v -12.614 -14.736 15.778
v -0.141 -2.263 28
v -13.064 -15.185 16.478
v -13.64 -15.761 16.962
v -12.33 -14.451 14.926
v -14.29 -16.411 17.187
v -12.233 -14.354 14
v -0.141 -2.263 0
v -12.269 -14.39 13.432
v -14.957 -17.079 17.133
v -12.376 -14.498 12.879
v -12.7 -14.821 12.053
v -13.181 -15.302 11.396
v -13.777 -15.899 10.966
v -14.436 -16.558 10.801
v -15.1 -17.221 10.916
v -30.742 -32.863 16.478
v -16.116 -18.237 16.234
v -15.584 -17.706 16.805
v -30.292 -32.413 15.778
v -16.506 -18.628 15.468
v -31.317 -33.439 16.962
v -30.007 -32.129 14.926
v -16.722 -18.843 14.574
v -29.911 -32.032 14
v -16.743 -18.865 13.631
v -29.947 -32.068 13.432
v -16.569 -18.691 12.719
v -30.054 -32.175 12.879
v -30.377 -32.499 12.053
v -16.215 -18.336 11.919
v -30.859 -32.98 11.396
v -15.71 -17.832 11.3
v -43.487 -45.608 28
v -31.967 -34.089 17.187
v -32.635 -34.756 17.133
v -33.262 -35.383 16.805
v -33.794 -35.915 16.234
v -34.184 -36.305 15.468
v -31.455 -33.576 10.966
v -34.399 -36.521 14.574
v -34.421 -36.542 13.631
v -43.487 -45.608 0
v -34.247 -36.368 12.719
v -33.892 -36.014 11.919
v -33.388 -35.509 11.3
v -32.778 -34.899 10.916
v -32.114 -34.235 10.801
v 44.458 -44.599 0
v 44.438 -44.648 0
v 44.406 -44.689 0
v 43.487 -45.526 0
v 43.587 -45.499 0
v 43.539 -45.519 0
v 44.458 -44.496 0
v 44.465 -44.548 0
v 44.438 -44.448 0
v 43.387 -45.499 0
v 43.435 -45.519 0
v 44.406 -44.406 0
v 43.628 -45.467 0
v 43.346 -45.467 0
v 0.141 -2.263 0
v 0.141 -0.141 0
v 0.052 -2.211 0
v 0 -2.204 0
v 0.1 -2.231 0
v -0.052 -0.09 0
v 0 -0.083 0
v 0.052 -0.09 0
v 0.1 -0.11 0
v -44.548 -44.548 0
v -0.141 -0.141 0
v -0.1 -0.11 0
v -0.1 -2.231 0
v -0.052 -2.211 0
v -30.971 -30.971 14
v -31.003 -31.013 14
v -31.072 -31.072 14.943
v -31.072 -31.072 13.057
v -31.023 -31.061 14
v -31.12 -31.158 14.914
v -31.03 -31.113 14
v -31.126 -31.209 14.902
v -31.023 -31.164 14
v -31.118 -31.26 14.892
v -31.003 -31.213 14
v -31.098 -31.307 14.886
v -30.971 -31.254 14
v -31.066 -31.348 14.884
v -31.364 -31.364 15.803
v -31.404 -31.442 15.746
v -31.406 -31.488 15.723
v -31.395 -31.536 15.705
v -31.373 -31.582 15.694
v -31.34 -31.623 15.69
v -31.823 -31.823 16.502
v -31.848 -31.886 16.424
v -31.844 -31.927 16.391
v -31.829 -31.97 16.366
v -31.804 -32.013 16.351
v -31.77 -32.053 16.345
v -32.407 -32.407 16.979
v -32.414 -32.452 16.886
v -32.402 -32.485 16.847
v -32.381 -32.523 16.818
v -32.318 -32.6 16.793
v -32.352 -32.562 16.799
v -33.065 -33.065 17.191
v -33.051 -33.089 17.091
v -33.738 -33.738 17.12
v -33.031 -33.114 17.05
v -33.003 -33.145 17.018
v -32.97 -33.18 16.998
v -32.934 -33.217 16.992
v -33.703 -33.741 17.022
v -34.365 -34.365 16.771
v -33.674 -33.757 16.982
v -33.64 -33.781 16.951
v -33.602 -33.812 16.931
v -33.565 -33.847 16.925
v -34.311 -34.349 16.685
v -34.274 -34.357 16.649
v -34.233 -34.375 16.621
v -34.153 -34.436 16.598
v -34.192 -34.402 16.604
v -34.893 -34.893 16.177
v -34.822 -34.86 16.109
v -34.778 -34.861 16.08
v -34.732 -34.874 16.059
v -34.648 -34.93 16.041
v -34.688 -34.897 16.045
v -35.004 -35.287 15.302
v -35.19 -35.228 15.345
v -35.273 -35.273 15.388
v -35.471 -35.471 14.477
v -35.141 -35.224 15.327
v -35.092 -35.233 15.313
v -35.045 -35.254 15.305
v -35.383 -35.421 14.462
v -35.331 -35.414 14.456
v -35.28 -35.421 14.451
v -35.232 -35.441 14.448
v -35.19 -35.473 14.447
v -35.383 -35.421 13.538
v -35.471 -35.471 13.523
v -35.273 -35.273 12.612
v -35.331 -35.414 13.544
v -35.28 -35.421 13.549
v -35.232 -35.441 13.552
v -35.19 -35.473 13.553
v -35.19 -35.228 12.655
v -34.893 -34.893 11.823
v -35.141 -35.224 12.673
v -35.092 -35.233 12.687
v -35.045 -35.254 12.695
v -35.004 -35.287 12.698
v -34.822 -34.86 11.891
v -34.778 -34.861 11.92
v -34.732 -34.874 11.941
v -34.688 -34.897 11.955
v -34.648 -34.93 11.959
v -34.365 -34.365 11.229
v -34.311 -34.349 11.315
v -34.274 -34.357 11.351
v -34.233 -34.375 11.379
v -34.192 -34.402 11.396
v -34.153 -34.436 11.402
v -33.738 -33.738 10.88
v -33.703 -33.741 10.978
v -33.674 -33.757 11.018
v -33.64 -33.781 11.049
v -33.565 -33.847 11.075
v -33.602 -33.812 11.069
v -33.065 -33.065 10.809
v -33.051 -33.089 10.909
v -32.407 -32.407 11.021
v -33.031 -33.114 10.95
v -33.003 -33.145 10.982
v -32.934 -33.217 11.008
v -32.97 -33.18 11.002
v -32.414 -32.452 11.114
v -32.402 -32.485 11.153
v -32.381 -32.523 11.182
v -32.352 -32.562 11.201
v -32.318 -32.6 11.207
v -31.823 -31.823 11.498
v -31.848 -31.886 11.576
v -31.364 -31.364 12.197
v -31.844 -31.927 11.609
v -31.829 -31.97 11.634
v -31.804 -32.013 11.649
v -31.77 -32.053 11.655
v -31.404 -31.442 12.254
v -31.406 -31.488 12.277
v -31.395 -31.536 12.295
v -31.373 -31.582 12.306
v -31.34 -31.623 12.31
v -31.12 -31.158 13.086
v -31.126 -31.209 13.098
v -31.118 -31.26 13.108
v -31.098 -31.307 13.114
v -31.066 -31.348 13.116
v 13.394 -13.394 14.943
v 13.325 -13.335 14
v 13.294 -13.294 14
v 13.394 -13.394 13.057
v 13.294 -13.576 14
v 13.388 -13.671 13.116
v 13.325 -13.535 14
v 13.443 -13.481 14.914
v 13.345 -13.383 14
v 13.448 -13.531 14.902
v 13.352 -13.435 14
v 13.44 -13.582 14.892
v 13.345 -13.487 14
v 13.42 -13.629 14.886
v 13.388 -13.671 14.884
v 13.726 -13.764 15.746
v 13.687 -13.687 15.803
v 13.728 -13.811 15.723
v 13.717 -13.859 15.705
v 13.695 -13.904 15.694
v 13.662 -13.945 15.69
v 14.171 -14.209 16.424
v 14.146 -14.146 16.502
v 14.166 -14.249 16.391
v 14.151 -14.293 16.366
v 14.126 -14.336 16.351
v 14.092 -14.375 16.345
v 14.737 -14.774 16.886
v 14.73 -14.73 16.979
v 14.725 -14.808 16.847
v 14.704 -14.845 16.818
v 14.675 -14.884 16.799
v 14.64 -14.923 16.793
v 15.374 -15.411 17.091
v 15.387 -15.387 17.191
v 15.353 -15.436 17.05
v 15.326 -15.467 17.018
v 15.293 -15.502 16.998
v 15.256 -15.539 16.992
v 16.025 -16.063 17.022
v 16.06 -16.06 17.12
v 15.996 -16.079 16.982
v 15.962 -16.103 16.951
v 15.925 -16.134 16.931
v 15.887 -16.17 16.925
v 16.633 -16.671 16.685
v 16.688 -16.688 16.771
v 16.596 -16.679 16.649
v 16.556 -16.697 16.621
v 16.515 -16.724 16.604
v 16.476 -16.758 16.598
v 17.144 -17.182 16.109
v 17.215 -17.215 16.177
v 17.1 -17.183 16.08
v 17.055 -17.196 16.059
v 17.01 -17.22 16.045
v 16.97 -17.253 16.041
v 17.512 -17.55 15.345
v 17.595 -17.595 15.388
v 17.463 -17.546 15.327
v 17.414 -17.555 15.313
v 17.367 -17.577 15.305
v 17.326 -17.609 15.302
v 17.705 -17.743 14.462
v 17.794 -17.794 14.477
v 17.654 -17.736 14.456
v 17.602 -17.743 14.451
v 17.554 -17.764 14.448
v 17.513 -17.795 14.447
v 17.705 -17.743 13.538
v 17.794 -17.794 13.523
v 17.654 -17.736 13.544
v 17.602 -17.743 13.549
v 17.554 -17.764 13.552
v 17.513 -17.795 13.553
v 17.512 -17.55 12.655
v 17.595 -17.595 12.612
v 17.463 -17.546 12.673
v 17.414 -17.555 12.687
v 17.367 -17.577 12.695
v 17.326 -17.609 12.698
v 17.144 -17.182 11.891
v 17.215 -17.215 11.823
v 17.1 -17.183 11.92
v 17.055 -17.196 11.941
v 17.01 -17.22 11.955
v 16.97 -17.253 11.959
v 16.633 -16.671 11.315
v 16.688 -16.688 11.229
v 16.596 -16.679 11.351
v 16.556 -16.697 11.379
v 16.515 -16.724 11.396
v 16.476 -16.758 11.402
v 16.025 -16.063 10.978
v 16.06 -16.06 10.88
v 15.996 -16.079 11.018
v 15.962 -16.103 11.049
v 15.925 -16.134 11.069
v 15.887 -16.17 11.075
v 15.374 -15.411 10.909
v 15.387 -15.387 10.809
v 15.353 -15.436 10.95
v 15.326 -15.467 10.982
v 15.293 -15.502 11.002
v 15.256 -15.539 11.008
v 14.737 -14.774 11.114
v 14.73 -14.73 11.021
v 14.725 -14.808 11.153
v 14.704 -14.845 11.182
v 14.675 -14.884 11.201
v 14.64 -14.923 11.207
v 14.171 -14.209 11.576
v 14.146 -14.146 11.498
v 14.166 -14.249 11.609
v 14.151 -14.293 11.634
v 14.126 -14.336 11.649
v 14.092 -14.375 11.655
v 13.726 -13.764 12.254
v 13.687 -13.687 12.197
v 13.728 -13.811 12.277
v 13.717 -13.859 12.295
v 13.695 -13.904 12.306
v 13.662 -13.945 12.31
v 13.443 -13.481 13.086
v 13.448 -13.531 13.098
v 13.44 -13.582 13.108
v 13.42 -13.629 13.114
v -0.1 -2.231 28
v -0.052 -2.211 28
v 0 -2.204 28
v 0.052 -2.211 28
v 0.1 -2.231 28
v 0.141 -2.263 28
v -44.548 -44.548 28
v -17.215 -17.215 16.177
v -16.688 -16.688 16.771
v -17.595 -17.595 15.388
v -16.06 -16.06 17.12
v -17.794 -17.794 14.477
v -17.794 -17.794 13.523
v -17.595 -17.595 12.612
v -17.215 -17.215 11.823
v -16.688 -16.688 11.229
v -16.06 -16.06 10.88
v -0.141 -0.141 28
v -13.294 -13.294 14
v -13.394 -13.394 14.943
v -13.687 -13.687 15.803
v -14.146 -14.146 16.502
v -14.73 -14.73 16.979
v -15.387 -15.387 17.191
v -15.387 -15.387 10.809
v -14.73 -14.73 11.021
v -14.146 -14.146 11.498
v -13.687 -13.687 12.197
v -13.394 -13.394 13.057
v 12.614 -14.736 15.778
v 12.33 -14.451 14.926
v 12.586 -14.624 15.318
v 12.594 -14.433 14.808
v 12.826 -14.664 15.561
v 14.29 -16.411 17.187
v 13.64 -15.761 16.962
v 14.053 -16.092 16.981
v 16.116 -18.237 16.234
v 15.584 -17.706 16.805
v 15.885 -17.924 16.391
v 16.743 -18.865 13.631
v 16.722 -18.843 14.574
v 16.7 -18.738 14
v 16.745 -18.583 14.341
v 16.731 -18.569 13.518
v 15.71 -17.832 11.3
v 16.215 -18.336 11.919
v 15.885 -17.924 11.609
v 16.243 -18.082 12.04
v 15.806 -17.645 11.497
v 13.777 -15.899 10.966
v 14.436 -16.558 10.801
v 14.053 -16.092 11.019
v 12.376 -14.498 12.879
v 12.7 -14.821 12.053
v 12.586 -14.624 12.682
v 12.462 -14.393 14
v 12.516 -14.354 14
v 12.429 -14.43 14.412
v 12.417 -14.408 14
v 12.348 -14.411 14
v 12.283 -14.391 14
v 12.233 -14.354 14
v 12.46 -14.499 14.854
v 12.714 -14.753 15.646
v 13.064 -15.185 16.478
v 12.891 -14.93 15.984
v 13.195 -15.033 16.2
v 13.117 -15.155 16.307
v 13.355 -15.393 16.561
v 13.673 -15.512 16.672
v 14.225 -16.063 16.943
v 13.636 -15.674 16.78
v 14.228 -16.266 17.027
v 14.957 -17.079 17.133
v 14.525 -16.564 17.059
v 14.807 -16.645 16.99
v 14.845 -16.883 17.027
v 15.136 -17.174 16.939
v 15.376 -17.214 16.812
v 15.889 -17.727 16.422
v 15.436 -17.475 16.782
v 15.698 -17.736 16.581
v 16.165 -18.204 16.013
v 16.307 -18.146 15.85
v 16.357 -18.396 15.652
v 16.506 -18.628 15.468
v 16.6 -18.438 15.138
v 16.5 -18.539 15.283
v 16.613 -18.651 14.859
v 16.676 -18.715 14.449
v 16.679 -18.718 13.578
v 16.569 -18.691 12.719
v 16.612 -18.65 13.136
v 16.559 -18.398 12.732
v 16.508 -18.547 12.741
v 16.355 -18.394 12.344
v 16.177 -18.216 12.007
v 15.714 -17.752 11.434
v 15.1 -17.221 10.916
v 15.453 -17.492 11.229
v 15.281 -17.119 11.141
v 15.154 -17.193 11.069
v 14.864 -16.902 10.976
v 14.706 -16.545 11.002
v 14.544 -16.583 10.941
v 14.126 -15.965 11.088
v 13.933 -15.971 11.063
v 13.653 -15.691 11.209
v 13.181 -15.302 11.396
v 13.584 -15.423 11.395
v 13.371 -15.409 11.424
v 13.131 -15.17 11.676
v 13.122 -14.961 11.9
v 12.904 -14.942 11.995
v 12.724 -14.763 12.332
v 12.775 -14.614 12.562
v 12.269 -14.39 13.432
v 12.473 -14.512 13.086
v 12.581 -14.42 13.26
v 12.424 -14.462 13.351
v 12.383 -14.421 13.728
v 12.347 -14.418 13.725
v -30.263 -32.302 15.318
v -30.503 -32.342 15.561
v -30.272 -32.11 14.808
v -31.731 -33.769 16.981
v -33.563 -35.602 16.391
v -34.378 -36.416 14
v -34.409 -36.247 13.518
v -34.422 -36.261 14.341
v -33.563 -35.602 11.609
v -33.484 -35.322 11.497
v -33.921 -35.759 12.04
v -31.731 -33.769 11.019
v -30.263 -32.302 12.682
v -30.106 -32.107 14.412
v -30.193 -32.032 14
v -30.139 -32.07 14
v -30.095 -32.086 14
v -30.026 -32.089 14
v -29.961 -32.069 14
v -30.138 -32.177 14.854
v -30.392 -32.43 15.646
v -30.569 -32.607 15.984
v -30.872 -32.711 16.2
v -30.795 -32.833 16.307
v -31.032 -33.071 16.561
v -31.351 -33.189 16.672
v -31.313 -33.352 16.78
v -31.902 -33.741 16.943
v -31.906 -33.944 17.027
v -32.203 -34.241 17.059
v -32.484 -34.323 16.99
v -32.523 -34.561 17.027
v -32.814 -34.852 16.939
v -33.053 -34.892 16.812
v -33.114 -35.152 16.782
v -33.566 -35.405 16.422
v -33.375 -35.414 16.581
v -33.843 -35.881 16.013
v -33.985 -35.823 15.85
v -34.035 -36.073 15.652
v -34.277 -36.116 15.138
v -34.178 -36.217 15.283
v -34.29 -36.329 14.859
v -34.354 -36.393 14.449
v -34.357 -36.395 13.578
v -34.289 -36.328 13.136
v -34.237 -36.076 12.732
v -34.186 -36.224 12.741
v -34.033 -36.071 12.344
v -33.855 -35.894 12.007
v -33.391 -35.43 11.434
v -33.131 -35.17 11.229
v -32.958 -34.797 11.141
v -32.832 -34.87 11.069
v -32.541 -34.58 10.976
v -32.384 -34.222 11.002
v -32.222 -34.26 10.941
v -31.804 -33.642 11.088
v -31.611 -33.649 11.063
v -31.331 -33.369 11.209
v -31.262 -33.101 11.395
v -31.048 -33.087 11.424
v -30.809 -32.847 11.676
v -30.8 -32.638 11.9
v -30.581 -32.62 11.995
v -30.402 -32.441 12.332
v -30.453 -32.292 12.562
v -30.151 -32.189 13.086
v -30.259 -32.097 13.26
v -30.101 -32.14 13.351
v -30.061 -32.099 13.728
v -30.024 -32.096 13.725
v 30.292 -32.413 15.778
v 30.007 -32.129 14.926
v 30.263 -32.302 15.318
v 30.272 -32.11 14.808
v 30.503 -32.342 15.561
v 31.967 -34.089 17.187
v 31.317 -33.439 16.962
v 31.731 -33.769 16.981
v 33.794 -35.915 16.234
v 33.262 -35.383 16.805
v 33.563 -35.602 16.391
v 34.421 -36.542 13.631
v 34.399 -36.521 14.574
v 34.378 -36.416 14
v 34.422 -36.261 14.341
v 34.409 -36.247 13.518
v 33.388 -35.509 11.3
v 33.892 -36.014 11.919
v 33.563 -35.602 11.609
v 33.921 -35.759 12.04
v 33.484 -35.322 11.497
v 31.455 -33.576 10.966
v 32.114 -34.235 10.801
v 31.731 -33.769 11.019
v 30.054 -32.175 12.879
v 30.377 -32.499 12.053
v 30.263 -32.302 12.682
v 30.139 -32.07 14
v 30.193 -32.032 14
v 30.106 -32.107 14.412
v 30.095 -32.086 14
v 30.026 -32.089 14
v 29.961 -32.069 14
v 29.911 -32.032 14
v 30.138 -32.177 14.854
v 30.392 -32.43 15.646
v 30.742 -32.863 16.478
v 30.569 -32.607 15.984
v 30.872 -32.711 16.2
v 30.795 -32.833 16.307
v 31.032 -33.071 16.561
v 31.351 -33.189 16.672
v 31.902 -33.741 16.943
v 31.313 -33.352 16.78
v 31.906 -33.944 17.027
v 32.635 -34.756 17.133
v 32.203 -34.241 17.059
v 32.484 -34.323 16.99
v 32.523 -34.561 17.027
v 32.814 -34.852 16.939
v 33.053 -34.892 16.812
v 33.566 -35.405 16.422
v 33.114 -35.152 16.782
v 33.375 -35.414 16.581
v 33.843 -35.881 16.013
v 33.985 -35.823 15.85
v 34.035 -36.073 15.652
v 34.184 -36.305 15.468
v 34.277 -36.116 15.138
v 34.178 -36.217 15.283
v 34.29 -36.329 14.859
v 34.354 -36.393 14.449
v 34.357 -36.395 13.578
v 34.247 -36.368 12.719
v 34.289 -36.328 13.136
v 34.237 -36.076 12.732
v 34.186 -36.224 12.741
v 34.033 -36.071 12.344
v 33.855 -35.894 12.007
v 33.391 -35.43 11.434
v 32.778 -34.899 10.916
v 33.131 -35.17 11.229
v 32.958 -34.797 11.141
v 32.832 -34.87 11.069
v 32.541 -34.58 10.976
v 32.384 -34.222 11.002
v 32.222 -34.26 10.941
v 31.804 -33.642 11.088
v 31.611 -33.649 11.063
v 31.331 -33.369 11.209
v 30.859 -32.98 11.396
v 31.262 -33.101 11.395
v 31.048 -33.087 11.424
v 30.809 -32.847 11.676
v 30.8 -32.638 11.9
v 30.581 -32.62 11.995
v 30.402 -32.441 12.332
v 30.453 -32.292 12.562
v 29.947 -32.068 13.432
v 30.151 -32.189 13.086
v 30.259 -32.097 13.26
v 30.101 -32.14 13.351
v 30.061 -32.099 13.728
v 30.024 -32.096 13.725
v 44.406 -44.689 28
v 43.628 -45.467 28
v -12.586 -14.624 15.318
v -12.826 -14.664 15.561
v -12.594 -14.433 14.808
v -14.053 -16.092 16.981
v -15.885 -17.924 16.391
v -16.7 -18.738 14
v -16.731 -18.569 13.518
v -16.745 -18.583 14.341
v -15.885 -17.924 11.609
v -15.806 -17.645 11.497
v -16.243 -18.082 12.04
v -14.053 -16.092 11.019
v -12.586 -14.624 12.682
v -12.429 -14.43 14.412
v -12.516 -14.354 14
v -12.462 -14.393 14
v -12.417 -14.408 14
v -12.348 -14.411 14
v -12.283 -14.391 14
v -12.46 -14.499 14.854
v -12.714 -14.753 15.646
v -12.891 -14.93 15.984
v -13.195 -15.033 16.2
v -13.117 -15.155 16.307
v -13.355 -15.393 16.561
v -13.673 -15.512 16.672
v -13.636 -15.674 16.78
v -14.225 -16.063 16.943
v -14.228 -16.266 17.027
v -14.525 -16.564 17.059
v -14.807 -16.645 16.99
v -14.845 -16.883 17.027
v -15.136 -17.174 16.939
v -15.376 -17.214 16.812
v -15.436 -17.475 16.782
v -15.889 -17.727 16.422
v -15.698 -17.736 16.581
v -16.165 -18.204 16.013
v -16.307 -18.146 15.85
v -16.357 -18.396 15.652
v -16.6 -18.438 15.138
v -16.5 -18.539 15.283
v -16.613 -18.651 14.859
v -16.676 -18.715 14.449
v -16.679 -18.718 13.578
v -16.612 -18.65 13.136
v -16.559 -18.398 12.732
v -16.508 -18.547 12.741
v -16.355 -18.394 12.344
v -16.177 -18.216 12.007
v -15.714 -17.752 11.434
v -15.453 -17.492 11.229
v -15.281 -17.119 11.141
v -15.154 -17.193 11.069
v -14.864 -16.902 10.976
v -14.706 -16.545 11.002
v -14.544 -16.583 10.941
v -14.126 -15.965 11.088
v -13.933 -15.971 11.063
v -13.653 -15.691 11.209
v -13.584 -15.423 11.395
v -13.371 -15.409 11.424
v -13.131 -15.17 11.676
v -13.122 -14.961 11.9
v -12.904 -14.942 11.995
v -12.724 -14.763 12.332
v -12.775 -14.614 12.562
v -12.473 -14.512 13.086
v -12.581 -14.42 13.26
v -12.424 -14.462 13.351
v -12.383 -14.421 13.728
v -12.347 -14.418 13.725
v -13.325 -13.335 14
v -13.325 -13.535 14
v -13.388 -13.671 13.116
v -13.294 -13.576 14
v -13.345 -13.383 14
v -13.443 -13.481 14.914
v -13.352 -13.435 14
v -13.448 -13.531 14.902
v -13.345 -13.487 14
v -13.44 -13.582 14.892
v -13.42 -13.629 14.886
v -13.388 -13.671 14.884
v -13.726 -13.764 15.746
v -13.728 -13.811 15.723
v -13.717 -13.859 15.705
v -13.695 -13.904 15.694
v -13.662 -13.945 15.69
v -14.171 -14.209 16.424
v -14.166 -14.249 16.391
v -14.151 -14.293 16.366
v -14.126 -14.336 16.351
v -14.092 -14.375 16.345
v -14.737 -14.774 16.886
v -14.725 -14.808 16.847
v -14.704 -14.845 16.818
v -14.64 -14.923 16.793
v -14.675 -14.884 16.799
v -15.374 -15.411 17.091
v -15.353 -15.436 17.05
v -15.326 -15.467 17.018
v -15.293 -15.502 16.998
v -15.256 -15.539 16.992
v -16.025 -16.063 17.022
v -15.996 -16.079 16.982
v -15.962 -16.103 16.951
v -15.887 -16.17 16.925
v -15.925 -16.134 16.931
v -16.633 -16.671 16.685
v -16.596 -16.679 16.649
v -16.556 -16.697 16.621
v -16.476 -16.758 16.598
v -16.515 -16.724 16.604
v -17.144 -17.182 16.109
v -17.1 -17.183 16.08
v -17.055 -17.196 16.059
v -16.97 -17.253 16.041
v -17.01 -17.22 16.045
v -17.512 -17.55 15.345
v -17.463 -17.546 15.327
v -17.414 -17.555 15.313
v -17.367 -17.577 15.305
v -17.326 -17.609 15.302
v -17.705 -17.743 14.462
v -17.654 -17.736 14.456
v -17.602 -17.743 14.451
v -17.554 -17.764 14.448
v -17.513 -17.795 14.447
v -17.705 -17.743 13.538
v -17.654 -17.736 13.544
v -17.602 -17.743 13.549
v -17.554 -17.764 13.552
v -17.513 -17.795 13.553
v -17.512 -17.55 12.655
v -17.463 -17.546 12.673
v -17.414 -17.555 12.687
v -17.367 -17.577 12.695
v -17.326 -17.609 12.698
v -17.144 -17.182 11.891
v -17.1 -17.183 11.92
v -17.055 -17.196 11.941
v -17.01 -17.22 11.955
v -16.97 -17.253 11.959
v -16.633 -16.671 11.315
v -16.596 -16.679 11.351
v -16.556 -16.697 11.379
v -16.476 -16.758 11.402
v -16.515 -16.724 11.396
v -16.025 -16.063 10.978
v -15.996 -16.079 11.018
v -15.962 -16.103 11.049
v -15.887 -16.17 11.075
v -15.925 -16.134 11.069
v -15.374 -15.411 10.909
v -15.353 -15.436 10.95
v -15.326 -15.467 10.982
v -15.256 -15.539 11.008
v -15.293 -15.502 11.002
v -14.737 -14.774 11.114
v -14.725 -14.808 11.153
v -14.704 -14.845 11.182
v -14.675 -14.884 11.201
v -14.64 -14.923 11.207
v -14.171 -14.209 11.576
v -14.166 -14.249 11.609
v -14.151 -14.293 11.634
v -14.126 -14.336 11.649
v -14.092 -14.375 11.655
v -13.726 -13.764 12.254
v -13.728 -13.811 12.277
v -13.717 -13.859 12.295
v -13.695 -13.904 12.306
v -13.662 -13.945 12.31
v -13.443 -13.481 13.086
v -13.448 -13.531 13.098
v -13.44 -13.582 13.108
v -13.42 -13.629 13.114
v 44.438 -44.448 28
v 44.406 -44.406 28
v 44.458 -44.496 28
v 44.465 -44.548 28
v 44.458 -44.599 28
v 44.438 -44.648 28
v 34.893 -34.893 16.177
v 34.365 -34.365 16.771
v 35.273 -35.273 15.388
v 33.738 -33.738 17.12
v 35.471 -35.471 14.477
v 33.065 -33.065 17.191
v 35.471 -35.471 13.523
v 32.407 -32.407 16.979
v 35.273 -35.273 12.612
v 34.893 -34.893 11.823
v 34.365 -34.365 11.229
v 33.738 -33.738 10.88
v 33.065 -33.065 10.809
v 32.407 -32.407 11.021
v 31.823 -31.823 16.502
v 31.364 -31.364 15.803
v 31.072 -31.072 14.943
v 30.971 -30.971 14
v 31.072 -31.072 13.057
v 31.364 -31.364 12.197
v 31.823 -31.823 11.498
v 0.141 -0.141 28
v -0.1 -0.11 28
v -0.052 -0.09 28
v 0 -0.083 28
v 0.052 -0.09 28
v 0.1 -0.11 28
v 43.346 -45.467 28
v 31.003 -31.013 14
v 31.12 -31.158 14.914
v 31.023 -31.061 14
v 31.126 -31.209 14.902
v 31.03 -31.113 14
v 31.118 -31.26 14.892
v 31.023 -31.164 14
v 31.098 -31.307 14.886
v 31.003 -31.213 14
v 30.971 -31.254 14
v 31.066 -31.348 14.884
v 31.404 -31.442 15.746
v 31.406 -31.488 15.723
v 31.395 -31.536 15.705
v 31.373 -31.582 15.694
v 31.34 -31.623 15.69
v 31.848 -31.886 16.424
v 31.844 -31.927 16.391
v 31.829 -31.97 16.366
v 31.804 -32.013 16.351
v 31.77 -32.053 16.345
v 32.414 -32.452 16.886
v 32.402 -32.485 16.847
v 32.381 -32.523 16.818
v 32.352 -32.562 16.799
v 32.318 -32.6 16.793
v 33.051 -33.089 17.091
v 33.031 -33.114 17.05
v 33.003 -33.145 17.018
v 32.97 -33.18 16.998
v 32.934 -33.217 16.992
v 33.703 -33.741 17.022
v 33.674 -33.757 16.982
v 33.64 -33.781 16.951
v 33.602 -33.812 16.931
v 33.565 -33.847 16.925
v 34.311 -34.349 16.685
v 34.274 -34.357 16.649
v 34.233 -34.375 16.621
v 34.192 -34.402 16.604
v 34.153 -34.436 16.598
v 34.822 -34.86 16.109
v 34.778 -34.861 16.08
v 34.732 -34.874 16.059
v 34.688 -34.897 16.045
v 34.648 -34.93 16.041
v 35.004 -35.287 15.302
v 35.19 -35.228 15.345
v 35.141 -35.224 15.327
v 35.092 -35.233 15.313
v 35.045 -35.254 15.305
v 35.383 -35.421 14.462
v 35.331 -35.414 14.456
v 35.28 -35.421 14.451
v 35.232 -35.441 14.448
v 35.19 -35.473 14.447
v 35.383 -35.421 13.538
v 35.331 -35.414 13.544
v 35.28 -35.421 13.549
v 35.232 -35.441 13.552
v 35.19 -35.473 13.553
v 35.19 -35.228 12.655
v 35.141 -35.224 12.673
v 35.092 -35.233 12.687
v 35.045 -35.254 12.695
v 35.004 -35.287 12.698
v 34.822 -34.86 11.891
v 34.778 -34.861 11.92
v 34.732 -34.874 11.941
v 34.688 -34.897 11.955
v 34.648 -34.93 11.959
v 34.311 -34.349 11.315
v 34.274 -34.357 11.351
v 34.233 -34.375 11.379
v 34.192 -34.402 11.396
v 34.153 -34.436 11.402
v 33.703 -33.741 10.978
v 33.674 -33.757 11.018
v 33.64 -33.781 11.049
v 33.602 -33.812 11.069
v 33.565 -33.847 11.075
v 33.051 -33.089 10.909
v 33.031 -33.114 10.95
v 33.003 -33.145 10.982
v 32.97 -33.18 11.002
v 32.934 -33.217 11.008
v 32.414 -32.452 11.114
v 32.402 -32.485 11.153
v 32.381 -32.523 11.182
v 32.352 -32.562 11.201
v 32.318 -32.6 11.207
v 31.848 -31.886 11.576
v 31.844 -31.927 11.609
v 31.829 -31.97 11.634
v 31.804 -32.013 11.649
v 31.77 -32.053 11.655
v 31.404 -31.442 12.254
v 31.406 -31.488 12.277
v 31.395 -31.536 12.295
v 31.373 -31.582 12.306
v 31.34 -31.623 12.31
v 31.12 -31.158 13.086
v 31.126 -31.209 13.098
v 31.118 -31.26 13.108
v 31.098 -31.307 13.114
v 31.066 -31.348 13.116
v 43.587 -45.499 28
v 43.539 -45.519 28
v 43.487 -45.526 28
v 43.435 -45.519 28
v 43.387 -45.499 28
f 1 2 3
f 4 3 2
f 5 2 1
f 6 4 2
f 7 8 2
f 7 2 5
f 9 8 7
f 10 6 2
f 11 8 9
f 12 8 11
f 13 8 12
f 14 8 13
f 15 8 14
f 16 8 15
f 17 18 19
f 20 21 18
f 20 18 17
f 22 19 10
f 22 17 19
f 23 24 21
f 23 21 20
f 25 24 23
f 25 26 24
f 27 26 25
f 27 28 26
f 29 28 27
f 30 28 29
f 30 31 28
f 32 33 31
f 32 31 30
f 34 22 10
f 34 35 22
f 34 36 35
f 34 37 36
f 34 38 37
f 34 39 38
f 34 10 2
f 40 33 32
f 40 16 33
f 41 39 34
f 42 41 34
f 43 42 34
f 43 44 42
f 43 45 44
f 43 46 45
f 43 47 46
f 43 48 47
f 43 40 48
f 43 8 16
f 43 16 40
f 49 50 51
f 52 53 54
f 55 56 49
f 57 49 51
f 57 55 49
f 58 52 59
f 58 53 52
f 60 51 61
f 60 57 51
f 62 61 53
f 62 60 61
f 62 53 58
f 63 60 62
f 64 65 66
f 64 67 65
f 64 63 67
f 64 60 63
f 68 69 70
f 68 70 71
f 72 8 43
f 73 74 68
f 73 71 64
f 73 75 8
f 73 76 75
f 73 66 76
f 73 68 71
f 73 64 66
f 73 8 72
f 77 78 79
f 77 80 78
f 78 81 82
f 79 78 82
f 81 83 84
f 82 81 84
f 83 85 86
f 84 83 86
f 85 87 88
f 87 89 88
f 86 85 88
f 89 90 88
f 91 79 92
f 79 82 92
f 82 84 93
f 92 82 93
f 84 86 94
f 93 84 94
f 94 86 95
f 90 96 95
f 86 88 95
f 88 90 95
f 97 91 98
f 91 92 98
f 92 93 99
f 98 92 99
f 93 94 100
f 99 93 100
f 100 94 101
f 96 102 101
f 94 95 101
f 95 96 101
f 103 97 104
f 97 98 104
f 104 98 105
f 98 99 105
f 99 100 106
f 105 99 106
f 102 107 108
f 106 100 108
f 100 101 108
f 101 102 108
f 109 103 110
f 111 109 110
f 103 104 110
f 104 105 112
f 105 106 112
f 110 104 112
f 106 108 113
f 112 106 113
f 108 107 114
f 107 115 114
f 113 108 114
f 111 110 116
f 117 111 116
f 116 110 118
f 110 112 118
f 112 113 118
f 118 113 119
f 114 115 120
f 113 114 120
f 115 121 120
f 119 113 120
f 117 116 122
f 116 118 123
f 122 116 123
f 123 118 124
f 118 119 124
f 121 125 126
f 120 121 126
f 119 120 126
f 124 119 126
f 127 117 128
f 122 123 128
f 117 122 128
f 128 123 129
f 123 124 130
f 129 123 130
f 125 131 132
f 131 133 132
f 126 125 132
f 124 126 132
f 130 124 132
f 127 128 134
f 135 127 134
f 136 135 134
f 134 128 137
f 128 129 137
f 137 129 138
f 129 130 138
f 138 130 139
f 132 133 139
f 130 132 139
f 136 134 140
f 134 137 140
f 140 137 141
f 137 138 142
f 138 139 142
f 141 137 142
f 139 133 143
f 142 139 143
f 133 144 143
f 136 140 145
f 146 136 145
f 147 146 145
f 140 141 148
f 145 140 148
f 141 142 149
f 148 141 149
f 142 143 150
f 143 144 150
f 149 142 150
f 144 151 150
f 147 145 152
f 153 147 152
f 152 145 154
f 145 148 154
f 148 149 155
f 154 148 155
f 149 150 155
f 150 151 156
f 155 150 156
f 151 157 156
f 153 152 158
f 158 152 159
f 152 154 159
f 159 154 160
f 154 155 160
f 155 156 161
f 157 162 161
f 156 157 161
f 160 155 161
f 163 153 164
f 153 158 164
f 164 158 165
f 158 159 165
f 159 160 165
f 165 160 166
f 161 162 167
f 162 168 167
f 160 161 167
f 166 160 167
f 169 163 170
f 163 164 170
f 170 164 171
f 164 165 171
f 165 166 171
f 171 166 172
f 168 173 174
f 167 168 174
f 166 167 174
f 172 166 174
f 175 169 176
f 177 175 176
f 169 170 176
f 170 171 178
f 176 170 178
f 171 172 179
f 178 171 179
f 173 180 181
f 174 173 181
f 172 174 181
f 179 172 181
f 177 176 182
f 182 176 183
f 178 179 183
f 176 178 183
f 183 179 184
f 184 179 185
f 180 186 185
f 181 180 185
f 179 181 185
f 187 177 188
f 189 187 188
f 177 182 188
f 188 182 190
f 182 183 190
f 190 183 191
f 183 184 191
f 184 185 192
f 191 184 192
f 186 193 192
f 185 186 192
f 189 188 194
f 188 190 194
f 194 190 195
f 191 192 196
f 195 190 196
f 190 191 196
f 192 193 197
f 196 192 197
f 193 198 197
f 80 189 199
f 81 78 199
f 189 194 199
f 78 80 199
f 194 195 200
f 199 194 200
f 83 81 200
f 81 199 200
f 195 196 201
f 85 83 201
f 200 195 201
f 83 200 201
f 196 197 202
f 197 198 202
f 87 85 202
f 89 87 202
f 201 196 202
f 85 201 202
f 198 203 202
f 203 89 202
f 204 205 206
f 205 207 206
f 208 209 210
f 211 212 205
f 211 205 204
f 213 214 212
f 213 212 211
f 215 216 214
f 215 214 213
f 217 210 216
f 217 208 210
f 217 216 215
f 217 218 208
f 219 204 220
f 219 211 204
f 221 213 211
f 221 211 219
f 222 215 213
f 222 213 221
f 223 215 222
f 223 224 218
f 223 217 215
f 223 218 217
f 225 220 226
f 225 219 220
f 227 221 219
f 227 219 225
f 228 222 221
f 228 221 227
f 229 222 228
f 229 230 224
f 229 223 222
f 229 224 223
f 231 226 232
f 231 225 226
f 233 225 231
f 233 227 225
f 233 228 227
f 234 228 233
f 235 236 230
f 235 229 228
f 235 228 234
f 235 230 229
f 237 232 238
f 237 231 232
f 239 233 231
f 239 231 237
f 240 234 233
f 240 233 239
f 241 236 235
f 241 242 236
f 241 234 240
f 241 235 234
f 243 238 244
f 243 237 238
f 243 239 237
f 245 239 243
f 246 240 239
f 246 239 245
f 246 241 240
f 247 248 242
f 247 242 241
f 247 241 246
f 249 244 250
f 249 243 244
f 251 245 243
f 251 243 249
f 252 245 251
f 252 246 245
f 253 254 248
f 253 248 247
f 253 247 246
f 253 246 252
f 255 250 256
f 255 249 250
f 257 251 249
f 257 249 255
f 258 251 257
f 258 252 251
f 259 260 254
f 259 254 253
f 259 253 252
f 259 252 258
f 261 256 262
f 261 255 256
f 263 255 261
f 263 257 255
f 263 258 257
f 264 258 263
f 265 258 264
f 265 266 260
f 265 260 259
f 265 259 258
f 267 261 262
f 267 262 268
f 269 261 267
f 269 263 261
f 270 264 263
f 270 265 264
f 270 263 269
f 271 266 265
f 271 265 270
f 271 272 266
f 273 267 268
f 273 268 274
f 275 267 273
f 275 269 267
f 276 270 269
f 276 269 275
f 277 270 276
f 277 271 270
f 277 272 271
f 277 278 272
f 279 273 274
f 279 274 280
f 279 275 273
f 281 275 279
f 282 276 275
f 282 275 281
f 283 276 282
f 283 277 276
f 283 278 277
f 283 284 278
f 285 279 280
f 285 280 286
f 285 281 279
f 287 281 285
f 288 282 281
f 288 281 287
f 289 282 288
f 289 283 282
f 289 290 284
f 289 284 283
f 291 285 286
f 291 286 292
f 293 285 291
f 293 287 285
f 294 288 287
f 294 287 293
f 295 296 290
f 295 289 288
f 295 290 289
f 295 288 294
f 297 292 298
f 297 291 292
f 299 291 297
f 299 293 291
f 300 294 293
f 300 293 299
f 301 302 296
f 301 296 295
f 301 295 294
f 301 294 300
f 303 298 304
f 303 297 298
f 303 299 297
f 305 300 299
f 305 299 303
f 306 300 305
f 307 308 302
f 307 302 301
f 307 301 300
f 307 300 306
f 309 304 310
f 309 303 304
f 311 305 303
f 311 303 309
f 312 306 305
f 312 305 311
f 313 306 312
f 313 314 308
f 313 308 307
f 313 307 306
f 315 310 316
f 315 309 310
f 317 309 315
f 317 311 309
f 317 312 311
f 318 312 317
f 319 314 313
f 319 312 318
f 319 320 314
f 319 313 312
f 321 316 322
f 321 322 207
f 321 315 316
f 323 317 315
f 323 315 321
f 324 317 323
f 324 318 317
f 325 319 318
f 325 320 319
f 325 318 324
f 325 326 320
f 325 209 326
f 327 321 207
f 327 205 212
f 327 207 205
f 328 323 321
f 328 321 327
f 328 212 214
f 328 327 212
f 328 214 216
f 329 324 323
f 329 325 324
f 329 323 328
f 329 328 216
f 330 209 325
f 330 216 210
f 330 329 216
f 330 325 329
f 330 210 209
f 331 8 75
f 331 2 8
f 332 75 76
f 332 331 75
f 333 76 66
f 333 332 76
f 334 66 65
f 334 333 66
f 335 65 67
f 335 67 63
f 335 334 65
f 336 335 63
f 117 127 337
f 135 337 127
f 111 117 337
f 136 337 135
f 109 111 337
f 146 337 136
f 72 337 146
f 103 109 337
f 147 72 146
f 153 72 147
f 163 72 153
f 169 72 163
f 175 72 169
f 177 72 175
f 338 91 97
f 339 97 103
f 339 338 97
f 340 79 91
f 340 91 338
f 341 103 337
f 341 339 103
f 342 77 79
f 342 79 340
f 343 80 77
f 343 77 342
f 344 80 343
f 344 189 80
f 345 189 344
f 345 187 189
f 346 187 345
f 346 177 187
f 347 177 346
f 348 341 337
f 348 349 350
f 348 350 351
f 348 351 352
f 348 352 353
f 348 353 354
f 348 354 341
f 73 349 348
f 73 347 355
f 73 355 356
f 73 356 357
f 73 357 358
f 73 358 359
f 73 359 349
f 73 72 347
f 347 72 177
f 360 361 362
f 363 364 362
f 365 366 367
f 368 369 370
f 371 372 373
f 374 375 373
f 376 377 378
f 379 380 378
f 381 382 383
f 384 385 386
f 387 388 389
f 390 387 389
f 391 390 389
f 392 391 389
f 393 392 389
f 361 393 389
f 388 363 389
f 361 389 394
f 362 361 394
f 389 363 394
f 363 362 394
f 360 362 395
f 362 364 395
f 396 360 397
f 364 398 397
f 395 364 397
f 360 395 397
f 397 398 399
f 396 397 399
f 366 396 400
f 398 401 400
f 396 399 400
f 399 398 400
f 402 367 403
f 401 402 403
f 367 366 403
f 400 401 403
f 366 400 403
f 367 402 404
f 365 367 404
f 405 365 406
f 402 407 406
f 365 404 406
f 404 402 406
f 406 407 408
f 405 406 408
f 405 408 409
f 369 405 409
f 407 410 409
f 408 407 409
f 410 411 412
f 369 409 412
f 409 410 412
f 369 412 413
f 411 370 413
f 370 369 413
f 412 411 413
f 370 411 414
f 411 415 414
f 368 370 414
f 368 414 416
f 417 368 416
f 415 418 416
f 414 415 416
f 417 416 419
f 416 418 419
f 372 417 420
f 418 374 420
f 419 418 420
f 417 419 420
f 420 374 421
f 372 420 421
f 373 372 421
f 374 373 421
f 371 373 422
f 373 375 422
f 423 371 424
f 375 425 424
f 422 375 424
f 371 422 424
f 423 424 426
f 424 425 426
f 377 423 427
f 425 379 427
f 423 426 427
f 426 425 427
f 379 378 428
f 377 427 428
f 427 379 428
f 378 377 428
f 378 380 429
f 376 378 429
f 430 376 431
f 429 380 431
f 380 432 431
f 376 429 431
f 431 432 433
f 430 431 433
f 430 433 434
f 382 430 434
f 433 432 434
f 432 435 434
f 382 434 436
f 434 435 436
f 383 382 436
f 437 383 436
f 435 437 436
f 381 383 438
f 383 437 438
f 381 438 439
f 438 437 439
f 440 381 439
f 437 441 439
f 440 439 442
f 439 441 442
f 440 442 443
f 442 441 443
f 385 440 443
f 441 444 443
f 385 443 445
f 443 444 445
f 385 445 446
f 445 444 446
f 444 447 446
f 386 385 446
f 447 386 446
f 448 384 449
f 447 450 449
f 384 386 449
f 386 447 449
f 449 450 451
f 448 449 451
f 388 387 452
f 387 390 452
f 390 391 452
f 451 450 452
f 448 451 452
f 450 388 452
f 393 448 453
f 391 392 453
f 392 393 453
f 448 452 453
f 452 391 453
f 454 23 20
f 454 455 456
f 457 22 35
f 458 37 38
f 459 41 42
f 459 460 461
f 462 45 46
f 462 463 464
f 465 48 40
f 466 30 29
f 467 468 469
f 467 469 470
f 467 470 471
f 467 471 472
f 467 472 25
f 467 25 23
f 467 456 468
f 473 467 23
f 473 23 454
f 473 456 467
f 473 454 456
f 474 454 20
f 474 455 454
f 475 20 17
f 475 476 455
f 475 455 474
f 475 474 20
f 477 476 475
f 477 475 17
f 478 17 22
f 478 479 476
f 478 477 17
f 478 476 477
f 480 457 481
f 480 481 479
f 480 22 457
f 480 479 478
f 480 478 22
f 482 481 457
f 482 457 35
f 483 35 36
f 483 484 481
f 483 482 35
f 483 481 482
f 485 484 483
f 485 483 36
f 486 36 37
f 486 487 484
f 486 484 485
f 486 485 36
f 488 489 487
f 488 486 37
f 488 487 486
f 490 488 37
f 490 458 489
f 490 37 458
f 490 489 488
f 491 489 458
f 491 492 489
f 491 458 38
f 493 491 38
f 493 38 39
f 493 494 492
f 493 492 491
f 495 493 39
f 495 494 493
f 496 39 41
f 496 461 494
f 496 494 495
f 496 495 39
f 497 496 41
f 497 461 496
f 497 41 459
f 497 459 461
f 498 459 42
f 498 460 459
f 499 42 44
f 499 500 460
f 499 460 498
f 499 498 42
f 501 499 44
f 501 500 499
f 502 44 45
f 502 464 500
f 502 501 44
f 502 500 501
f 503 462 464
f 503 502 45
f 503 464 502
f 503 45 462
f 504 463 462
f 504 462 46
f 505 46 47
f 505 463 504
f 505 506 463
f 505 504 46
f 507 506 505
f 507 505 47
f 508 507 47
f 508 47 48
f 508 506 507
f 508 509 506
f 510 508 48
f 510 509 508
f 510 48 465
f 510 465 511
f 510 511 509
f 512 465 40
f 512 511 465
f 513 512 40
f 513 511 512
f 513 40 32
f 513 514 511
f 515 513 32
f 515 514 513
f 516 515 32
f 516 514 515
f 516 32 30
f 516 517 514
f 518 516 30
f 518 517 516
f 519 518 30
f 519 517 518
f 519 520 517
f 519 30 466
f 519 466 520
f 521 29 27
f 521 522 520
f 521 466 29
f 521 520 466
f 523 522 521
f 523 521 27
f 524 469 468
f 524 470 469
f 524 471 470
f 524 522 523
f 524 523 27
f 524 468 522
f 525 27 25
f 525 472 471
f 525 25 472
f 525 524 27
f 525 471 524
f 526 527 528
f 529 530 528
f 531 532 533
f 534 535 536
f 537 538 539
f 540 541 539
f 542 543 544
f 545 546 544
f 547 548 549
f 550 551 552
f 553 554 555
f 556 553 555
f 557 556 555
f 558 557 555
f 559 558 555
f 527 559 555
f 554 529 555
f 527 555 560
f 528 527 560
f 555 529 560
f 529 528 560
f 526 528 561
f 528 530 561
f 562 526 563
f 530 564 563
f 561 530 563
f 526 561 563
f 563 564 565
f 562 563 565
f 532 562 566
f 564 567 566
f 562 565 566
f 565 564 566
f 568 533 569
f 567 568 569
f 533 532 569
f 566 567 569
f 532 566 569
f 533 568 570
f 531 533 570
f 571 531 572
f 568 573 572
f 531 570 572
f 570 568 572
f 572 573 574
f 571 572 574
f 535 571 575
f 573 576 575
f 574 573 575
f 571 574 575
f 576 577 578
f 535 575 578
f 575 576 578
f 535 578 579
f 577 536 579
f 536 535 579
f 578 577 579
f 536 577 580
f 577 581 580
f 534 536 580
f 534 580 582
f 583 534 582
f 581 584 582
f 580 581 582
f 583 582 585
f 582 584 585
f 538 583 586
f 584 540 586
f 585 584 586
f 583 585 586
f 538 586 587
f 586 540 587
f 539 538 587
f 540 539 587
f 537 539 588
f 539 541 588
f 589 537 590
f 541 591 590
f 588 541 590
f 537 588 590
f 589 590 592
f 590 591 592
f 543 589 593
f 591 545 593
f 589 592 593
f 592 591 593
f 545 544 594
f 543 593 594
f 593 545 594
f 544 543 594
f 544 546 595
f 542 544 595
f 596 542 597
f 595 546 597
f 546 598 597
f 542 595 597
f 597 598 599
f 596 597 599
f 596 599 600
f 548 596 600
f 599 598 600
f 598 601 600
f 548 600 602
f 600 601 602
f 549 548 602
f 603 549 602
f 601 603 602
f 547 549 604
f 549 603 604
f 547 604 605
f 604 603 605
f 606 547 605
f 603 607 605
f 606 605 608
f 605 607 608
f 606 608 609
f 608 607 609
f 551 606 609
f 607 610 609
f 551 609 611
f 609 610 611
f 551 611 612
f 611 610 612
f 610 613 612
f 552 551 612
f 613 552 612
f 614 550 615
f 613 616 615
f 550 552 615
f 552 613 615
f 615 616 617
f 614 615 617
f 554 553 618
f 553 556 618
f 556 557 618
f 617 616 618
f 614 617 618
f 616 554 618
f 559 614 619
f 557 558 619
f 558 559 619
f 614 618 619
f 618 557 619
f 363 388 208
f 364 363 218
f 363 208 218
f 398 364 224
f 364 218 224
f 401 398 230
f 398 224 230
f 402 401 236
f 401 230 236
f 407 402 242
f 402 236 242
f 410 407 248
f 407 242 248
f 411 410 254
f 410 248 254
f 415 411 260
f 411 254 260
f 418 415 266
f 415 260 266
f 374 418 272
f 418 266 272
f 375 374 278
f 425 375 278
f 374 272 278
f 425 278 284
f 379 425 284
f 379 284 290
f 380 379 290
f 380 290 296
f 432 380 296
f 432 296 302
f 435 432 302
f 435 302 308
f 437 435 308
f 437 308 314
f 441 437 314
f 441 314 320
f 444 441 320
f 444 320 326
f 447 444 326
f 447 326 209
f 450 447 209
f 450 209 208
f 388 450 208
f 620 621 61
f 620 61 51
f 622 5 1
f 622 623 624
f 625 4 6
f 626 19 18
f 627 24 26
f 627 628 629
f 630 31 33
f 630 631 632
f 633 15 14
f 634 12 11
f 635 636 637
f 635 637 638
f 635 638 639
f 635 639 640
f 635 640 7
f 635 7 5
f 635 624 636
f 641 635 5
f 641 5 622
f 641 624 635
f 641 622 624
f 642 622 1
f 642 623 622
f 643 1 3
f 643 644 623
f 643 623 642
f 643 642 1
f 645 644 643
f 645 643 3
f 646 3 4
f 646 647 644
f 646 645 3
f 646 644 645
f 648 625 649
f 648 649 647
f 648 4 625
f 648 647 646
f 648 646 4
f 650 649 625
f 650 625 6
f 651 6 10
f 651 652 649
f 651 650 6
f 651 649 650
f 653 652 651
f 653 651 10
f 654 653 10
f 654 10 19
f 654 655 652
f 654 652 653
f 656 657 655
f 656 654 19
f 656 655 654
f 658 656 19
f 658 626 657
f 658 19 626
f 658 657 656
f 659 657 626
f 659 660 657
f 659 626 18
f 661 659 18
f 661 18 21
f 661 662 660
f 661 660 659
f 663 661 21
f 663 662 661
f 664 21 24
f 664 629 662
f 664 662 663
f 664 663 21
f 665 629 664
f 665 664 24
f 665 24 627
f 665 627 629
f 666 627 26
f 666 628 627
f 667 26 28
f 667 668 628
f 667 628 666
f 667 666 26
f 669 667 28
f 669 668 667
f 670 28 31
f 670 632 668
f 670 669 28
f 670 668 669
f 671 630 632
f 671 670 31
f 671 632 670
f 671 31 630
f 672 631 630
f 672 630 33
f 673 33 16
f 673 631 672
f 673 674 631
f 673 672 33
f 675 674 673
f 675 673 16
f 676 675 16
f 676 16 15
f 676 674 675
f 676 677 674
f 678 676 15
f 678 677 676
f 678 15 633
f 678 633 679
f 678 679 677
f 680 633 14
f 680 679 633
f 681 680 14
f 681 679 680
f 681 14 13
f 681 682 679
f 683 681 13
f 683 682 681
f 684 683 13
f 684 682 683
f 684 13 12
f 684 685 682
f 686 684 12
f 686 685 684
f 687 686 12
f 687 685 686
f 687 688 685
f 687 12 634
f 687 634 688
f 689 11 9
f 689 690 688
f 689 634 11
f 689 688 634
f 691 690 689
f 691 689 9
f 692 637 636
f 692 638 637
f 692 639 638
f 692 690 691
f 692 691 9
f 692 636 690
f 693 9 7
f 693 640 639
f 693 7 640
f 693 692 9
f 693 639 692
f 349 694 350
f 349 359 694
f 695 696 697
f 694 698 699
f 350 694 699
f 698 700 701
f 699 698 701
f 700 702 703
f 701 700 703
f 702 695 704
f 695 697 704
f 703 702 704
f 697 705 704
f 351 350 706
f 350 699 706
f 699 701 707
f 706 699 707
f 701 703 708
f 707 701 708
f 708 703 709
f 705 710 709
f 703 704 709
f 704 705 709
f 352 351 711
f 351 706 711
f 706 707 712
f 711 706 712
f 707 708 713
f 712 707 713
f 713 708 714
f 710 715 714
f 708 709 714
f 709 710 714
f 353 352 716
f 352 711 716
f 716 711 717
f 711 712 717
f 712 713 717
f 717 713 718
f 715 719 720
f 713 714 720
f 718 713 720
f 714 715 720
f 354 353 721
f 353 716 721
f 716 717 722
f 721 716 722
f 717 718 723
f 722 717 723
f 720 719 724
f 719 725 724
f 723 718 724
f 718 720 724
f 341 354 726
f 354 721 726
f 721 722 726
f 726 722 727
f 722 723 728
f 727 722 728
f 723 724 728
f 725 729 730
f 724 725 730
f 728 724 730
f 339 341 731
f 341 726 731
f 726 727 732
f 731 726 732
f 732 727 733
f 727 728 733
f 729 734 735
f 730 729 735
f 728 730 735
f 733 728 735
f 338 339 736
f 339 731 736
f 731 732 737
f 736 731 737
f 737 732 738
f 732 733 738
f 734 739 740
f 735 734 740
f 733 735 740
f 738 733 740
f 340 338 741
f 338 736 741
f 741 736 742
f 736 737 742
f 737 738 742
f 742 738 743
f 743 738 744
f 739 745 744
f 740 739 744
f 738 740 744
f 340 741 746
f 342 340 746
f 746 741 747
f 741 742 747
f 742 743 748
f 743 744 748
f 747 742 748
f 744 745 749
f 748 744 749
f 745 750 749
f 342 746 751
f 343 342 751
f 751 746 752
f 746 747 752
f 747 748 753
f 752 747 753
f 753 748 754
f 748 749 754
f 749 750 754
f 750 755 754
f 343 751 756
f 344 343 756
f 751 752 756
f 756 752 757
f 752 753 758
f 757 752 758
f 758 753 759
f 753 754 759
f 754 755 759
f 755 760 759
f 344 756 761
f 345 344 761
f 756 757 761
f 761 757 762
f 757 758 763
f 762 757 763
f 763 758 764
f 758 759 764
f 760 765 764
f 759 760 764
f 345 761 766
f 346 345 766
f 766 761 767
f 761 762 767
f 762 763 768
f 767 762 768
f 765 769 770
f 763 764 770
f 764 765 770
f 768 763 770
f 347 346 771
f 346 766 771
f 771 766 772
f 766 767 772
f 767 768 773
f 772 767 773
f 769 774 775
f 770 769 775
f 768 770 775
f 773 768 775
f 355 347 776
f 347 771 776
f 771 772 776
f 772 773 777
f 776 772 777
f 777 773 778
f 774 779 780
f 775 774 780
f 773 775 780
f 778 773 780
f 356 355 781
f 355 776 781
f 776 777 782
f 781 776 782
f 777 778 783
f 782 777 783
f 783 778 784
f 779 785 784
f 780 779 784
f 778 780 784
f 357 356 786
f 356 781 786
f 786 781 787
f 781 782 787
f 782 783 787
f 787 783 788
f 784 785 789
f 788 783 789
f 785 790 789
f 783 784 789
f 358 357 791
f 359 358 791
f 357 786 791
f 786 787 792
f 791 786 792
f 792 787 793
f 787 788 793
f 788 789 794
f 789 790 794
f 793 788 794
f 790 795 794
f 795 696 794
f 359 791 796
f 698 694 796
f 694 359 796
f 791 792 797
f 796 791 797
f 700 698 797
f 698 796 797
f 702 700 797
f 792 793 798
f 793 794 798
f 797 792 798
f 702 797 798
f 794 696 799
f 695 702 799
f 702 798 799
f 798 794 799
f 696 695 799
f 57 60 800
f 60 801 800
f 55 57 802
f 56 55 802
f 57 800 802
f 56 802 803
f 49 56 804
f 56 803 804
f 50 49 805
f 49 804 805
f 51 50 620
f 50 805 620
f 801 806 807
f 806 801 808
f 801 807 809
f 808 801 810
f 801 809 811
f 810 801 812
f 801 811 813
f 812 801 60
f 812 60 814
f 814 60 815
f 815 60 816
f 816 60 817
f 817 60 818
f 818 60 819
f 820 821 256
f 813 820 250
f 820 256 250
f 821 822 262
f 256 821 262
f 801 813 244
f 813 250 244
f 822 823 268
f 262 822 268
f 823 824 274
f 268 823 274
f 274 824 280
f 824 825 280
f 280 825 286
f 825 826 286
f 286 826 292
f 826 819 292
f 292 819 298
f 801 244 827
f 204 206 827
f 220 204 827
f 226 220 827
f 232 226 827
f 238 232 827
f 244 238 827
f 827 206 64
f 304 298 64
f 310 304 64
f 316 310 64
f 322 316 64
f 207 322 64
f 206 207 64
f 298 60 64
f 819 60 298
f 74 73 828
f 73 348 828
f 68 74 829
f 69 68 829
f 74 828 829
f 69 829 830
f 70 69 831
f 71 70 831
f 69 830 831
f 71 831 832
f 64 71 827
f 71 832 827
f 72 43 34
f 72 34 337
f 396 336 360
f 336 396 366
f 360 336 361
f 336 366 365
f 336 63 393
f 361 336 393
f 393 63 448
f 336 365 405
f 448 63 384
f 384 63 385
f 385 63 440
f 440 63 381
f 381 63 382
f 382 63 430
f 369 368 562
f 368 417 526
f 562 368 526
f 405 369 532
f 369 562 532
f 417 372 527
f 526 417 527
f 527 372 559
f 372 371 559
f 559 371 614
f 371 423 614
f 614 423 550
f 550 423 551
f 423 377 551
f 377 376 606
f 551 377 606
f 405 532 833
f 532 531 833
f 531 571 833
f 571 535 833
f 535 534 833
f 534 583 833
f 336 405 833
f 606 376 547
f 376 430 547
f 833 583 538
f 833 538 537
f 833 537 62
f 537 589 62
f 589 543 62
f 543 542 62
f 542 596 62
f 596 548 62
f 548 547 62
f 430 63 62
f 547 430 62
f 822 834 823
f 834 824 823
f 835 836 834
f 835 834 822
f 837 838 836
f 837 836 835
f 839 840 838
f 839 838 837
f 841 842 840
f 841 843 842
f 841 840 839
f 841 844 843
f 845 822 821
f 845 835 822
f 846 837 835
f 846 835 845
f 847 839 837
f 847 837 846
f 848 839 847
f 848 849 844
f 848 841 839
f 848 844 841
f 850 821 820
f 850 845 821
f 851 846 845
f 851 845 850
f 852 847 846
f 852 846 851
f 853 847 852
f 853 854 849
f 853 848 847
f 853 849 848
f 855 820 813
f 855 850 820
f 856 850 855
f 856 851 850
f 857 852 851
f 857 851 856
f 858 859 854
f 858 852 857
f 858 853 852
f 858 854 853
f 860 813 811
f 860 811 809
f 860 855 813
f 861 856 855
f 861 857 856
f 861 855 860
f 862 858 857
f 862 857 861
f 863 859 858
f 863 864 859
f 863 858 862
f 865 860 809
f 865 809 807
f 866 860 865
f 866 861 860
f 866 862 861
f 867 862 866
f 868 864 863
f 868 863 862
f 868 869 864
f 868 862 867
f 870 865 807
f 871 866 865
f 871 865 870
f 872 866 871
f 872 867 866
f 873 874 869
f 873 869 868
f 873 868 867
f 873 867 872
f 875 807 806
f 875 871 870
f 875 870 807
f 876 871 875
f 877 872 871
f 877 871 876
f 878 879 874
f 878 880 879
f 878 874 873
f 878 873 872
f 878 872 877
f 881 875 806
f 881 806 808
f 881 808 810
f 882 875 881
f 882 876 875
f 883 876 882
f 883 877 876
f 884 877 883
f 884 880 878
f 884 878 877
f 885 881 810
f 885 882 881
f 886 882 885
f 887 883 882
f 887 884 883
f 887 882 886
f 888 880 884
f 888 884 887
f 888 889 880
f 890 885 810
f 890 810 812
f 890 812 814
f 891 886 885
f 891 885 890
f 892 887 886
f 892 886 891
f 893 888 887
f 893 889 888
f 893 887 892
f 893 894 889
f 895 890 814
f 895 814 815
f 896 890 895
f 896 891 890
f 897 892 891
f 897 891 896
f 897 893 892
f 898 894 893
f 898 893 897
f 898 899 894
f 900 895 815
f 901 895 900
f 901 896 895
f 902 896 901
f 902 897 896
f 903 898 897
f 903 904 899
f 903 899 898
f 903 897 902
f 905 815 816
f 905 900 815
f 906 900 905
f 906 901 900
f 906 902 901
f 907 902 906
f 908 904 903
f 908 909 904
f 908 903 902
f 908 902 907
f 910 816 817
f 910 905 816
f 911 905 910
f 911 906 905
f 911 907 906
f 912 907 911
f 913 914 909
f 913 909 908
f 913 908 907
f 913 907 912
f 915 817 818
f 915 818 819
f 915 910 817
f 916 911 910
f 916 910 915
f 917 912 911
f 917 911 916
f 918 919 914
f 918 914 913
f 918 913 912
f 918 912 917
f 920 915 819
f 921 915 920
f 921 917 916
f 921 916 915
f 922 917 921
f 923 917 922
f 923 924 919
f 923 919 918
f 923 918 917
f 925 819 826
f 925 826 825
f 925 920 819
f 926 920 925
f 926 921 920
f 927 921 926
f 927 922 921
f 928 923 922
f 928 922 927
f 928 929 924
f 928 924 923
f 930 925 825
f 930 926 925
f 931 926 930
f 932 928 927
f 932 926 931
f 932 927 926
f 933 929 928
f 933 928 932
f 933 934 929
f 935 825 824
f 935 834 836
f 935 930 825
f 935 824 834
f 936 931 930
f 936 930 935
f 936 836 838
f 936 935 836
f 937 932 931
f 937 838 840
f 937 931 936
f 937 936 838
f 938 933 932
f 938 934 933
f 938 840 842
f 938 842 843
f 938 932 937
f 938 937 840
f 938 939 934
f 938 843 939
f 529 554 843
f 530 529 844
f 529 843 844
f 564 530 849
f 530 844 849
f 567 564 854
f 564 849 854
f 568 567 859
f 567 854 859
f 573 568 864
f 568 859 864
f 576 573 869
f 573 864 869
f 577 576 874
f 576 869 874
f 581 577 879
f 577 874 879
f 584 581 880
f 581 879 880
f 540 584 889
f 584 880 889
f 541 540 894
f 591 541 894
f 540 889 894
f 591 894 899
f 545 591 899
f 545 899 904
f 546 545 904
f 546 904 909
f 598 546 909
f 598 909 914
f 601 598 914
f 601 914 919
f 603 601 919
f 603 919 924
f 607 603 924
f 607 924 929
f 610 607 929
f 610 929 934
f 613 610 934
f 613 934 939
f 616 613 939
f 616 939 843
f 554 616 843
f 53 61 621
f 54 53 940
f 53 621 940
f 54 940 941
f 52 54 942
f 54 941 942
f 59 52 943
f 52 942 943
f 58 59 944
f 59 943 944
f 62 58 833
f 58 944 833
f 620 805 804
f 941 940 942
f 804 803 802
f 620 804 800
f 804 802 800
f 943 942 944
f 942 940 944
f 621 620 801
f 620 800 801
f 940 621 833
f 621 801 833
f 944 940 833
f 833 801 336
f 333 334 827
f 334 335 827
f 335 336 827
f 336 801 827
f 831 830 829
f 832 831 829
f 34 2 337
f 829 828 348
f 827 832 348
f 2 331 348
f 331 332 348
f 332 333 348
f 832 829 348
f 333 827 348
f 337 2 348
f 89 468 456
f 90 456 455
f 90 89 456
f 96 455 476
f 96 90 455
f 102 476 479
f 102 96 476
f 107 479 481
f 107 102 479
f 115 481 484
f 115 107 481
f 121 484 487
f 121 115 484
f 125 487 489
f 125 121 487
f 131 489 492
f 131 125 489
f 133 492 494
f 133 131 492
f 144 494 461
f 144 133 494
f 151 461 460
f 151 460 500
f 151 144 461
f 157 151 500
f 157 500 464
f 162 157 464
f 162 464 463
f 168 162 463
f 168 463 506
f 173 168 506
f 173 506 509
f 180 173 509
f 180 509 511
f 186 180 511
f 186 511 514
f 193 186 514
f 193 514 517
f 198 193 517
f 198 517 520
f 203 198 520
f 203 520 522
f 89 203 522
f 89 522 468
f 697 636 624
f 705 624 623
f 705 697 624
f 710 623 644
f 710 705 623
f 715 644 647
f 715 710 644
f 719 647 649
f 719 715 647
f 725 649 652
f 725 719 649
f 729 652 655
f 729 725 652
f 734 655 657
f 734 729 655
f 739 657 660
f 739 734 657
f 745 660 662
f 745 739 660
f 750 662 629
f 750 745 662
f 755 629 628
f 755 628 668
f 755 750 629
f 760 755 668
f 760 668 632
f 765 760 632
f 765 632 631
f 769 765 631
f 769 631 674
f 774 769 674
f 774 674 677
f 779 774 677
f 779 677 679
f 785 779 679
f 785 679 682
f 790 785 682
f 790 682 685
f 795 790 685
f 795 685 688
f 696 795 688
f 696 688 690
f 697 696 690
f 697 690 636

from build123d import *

# Parameters (mm, degrees)
F1_DEPTH = 28
F2_R     = 3
F3_DEPTH = 2
F5_R     = 0.2


with BuildPart() as f1:
    # F0 (on Top) → F1 (new body)
    with BuildSketch(Plane.XY):
        Polygon((44.5477272148, -44.5477272148), (0, 0), (0, -2.1213203436), (43.487067043, -45.6083873865), align=None)
    extrude(amount=F1_DEPTH)

    # F2 (on face) → F3 (cut)
    with BuildSketch(Plane(origin=(0, 0, 0), x_dir=(-0.7071067812, 0.7071067812, 0), z_dir=(0.7071067812, 0.7071067812, 0))):
        with Locations((-22, 14)):
            Circle(F2_R)
        with Locations((-47, 14)):
            Circle(F2_R)
    extrude(amount=-F3_DEPTH, mode=Mode.SUBTRACT)

    # F4: F1 across plane


with BuildPart() as f1_1:
    add(f1.part)
    add(f1.part.mirror(Plane.YZ))

    # F5
    f5_edges = [f1_1.edges().sort_by_distance(p)[0] for p in [
        (44.547727, -44.547727, 14),
        (43.487067, -45.608387, 14),
        (0, 0, 14),
        (0, -2.12132, 14),
        (-17.67767, -17.67767, 14),
        (-12.904699, -13.965359, 14),
        (-16.617009, -18.73833, 14),
        (-35.355339, -35.355339, 14),
        (-30.582368, -31.643028, 14),
        (-34.294679, -36.415999, 14),
        (17.67767, -17.67767, 14),
        (12.904699, -13.965359, 14),
        (16.617009, -18.73833, 14),
        (35.355339, -35.355339, 14),
        (30.582368, -31.643028, 14),
        (34.294679, -36.415999, 14),
    ]]
    fillet(f5_edges, radius=F5_R)


solid = f1_1.part
